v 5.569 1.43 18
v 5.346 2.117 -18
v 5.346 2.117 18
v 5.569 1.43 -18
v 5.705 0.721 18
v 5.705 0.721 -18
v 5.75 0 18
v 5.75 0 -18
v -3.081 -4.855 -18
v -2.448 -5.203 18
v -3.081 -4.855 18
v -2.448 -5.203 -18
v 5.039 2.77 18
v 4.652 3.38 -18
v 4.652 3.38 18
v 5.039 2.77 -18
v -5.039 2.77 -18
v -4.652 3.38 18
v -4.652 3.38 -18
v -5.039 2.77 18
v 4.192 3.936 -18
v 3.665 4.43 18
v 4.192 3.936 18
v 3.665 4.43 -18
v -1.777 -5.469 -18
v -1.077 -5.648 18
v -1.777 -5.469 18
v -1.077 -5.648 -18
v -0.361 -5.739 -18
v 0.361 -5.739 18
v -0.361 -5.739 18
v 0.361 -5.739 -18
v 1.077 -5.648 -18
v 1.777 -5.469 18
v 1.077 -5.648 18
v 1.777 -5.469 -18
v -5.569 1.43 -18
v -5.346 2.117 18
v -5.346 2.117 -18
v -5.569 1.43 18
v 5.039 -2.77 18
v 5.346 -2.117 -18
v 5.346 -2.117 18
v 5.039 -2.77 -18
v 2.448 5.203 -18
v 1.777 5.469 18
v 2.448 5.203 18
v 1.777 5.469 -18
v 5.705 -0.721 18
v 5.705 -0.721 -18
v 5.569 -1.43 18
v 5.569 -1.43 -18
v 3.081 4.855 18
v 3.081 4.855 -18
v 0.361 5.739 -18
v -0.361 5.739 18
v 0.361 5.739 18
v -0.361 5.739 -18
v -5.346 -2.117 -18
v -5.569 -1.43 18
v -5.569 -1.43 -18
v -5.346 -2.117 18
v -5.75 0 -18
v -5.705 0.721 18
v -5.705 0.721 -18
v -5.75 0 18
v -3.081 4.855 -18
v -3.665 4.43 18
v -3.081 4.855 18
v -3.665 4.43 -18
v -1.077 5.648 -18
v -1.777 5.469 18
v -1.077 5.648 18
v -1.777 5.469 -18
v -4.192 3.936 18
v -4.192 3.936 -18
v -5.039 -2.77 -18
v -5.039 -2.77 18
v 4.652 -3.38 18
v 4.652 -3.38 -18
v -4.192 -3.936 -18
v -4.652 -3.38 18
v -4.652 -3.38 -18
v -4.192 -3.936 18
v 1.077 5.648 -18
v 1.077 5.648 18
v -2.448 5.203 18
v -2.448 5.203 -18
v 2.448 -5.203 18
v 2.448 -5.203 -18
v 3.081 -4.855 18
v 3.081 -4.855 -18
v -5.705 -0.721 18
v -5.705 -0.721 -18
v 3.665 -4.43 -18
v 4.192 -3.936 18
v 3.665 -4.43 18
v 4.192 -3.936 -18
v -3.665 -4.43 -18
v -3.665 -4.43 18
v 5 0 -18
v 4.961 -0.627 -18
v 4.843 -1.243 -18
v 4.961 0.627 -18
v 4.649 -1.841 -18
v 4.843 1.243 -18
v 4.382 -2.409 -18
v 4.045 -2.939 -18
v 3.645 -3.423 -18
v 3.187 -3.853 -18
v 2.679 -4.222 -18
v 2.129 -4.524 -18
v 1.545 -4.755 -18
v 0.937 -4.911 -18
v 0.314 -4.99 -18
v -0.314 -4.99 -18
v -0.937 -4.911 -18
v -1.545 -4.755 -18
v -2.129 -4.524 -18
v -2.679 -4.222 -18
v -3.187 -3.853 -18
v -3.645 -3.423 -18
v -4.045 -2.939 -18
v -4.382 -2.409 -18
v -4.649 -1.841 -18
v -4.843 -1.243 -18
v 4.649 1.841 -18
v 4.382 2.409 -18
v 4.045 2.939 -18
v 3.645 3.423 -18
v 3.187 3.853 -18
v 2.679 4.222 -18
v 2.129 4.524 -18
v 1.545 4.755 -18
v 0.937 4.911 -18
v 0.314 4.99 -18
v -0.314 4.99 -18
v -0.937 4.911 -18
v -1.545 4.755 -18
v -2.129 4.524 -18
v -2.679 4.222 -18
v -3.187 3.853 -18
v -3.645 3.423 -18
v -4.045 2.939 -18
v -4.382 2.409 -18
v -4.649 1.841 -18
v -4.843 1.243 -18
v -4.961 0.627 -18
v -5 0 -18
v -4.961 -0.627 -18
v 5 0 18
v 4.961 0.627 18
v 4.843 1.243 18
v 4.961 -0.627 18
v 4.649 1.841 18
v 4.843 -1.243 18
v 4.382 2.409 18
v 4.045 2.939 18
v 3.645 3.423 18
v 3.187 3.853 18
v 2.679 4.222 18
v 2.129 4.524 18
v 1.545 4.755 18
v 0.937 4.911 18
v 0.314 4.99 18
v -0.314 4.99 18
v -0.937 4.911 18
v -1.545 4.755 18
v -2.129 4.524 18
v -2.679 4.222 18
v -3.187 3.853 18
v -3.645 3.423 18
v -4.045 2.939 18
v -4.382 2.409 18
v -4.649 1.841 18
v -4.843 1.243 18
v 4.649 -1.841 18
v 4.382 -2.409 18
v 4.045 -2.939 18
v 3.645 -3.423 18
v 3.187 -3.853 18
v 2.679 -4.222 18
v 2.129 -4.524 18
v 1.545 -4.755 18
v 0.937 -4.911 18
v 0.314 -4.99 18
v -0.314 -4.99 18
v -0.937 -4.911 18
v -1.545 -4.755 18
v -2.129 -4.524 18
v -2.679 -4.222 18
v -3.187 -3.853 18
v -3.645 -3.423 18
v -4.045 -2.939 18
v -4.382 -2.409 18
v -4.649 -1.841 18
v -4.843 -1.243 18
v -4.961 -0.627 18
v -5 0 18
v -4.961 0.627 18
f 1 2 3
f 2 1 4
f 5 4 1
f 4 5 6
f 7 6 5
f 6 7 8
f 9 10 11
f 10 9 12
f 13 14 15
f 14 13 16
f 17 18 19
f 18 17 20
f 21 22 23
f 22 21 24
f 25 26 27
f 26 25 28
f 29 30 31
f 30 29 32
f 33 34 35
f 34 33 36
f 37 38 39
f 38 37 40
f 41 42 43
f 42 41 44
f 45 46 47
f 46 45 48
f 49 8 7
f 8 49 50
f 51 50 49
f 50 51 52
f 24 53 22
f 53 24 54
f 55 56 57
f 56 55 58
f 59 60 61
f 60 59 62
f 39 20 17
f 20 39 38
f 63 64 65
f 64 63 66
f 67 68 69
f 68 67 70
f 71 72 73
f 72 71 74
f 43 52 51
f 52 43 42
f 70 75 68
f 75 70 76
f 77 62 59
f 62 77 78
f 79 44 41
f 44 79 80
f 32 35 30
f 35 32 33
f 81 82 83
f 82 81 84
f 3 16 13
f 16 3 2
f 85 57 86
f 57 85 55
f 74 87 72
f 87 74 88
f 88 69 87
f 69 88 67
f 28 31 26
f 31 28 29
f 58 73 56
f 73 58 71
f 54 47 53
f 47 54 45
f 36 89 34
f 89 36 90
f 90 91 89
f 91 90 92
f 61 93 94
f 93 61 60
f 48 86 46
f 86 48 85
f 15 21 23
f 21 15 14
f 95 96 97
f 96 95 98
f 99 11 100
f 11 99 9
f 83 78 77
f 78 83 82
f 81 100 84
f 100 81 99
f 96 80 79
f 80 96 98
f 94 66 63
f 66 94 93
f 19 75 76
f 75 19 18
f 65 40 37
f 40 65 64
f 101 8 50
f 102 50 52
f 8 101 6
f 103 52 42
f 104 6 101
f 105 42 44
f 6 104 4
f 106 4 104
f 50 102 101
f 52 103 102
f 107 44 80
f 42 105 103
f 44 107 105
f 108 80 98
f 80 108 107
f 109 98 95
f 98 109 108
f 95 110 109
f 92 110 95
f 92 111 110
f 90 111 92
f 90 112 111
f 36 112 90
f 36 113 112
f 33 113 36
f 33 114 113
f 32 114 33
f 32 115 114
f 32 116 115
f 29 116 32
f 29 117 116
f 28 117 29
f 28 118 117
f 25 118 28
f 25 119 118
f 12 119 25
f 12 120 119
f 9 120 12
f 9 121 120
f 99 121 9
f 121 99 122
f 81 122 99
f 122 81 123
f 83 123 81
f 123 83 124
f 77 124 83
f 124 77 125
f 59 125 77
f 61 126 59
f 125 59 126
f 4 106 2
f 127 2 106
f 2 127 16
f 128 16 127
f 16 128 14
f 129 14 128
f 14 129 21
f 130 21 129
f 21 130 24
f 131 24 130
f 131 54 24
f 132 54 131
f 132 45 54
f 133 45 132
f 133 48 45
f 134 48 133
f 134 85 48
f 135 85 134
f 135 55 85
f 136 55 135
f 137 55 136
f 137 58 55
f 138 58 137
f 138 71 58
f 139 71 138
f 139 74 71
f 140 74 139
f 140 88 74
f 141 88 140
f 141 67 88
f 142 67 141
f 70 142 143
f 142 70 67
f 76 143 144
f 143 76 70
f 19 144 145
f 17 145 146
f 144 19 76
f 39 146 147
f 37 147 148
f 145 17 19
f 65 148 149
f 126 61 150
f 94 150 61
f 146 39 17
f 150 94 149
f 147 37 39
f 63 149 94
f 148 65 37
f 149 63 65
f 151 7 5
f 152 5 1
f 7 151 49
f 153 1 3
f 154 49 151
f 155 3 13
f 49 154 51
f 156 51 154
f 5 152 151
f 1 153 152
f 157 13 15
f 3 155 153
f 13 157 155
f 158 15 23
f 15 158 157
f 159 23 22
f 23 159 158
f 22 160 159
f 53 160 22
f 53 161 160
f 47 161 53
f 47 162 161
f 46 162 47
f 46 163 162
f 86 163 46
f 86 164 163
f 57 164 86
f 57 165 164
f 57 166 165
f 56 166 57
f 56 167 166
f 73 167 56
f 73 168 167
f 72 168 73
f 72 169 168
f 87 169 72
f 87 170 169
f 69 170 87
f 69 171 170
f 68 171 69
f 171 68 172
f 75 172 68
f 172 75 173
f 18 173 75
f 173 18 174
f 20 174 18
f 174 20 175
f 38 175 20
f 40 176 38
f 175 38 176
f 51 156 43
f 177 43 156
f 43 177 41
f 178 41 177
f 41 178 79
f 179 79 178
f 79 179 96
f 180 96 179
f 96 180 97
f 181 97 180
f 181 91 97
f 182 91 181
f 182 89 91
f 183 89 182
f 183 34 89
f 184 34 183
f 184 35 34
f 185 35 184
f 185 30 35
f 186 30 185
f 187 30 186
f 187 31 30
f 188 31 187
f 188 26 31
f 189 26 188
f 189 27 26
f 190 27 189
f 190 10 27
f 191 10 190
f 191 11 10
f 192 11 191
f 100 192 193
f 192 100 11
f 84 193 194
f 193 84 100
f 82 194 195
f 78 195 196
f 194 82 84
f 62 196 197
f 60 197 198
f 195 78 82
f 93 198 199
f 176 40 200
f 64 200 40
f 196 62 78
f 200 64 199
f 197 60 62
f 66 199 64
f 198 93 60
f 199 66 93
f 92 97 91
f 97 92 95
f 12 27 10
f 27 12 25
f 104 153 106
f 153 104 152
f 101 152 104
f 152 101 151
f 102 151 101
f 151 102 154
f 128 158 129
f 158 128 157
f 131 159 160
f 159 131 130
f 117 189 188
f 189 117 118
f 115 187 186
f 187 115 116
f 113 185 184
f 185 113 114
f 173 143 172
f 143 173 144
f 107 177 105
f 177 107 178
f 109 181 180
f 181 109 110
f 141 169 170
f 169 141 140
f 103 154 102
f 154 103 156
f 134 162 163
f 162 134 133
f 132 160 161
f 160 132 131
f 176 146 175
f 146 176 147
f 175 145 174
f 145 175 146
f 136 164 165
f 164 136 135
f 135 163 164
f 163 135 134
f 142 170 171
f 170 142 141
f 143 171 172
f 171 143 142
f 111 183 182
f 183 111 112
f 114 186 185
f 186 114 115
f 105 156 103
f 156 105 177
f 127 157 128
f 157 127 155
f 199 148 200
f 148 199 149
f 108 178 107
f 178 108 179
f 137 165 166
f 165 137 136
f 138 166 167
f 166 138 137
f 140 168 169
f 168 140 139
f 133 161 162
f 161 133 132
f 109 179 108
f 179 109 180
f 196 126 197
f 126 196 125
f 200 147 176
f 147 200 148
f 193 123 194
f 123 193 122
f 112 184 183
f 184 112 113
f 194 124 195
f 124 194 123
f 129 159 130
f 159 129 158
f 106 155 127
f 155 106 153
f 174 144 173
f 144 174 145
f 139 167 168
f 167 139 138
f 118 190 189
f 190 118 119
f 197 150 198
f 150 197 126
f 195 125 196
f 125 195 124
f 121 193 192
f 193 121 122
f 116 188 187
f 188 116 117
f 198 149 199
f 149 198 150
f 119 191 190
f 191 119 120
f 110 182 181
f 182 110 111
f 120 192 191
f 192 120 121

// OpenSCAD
$fn = 50;


difference() {
	union() {
		translate(v = [0, 0, -18.0000000000]) {
			cylinder(h = 36, r = 5.7500000000);
		}
	}
	union() {
		translate(v = [0, 0, -100.0000000000]) {
			cylinder(h = 200, r = 5.0000000000);
		}
	}
}
